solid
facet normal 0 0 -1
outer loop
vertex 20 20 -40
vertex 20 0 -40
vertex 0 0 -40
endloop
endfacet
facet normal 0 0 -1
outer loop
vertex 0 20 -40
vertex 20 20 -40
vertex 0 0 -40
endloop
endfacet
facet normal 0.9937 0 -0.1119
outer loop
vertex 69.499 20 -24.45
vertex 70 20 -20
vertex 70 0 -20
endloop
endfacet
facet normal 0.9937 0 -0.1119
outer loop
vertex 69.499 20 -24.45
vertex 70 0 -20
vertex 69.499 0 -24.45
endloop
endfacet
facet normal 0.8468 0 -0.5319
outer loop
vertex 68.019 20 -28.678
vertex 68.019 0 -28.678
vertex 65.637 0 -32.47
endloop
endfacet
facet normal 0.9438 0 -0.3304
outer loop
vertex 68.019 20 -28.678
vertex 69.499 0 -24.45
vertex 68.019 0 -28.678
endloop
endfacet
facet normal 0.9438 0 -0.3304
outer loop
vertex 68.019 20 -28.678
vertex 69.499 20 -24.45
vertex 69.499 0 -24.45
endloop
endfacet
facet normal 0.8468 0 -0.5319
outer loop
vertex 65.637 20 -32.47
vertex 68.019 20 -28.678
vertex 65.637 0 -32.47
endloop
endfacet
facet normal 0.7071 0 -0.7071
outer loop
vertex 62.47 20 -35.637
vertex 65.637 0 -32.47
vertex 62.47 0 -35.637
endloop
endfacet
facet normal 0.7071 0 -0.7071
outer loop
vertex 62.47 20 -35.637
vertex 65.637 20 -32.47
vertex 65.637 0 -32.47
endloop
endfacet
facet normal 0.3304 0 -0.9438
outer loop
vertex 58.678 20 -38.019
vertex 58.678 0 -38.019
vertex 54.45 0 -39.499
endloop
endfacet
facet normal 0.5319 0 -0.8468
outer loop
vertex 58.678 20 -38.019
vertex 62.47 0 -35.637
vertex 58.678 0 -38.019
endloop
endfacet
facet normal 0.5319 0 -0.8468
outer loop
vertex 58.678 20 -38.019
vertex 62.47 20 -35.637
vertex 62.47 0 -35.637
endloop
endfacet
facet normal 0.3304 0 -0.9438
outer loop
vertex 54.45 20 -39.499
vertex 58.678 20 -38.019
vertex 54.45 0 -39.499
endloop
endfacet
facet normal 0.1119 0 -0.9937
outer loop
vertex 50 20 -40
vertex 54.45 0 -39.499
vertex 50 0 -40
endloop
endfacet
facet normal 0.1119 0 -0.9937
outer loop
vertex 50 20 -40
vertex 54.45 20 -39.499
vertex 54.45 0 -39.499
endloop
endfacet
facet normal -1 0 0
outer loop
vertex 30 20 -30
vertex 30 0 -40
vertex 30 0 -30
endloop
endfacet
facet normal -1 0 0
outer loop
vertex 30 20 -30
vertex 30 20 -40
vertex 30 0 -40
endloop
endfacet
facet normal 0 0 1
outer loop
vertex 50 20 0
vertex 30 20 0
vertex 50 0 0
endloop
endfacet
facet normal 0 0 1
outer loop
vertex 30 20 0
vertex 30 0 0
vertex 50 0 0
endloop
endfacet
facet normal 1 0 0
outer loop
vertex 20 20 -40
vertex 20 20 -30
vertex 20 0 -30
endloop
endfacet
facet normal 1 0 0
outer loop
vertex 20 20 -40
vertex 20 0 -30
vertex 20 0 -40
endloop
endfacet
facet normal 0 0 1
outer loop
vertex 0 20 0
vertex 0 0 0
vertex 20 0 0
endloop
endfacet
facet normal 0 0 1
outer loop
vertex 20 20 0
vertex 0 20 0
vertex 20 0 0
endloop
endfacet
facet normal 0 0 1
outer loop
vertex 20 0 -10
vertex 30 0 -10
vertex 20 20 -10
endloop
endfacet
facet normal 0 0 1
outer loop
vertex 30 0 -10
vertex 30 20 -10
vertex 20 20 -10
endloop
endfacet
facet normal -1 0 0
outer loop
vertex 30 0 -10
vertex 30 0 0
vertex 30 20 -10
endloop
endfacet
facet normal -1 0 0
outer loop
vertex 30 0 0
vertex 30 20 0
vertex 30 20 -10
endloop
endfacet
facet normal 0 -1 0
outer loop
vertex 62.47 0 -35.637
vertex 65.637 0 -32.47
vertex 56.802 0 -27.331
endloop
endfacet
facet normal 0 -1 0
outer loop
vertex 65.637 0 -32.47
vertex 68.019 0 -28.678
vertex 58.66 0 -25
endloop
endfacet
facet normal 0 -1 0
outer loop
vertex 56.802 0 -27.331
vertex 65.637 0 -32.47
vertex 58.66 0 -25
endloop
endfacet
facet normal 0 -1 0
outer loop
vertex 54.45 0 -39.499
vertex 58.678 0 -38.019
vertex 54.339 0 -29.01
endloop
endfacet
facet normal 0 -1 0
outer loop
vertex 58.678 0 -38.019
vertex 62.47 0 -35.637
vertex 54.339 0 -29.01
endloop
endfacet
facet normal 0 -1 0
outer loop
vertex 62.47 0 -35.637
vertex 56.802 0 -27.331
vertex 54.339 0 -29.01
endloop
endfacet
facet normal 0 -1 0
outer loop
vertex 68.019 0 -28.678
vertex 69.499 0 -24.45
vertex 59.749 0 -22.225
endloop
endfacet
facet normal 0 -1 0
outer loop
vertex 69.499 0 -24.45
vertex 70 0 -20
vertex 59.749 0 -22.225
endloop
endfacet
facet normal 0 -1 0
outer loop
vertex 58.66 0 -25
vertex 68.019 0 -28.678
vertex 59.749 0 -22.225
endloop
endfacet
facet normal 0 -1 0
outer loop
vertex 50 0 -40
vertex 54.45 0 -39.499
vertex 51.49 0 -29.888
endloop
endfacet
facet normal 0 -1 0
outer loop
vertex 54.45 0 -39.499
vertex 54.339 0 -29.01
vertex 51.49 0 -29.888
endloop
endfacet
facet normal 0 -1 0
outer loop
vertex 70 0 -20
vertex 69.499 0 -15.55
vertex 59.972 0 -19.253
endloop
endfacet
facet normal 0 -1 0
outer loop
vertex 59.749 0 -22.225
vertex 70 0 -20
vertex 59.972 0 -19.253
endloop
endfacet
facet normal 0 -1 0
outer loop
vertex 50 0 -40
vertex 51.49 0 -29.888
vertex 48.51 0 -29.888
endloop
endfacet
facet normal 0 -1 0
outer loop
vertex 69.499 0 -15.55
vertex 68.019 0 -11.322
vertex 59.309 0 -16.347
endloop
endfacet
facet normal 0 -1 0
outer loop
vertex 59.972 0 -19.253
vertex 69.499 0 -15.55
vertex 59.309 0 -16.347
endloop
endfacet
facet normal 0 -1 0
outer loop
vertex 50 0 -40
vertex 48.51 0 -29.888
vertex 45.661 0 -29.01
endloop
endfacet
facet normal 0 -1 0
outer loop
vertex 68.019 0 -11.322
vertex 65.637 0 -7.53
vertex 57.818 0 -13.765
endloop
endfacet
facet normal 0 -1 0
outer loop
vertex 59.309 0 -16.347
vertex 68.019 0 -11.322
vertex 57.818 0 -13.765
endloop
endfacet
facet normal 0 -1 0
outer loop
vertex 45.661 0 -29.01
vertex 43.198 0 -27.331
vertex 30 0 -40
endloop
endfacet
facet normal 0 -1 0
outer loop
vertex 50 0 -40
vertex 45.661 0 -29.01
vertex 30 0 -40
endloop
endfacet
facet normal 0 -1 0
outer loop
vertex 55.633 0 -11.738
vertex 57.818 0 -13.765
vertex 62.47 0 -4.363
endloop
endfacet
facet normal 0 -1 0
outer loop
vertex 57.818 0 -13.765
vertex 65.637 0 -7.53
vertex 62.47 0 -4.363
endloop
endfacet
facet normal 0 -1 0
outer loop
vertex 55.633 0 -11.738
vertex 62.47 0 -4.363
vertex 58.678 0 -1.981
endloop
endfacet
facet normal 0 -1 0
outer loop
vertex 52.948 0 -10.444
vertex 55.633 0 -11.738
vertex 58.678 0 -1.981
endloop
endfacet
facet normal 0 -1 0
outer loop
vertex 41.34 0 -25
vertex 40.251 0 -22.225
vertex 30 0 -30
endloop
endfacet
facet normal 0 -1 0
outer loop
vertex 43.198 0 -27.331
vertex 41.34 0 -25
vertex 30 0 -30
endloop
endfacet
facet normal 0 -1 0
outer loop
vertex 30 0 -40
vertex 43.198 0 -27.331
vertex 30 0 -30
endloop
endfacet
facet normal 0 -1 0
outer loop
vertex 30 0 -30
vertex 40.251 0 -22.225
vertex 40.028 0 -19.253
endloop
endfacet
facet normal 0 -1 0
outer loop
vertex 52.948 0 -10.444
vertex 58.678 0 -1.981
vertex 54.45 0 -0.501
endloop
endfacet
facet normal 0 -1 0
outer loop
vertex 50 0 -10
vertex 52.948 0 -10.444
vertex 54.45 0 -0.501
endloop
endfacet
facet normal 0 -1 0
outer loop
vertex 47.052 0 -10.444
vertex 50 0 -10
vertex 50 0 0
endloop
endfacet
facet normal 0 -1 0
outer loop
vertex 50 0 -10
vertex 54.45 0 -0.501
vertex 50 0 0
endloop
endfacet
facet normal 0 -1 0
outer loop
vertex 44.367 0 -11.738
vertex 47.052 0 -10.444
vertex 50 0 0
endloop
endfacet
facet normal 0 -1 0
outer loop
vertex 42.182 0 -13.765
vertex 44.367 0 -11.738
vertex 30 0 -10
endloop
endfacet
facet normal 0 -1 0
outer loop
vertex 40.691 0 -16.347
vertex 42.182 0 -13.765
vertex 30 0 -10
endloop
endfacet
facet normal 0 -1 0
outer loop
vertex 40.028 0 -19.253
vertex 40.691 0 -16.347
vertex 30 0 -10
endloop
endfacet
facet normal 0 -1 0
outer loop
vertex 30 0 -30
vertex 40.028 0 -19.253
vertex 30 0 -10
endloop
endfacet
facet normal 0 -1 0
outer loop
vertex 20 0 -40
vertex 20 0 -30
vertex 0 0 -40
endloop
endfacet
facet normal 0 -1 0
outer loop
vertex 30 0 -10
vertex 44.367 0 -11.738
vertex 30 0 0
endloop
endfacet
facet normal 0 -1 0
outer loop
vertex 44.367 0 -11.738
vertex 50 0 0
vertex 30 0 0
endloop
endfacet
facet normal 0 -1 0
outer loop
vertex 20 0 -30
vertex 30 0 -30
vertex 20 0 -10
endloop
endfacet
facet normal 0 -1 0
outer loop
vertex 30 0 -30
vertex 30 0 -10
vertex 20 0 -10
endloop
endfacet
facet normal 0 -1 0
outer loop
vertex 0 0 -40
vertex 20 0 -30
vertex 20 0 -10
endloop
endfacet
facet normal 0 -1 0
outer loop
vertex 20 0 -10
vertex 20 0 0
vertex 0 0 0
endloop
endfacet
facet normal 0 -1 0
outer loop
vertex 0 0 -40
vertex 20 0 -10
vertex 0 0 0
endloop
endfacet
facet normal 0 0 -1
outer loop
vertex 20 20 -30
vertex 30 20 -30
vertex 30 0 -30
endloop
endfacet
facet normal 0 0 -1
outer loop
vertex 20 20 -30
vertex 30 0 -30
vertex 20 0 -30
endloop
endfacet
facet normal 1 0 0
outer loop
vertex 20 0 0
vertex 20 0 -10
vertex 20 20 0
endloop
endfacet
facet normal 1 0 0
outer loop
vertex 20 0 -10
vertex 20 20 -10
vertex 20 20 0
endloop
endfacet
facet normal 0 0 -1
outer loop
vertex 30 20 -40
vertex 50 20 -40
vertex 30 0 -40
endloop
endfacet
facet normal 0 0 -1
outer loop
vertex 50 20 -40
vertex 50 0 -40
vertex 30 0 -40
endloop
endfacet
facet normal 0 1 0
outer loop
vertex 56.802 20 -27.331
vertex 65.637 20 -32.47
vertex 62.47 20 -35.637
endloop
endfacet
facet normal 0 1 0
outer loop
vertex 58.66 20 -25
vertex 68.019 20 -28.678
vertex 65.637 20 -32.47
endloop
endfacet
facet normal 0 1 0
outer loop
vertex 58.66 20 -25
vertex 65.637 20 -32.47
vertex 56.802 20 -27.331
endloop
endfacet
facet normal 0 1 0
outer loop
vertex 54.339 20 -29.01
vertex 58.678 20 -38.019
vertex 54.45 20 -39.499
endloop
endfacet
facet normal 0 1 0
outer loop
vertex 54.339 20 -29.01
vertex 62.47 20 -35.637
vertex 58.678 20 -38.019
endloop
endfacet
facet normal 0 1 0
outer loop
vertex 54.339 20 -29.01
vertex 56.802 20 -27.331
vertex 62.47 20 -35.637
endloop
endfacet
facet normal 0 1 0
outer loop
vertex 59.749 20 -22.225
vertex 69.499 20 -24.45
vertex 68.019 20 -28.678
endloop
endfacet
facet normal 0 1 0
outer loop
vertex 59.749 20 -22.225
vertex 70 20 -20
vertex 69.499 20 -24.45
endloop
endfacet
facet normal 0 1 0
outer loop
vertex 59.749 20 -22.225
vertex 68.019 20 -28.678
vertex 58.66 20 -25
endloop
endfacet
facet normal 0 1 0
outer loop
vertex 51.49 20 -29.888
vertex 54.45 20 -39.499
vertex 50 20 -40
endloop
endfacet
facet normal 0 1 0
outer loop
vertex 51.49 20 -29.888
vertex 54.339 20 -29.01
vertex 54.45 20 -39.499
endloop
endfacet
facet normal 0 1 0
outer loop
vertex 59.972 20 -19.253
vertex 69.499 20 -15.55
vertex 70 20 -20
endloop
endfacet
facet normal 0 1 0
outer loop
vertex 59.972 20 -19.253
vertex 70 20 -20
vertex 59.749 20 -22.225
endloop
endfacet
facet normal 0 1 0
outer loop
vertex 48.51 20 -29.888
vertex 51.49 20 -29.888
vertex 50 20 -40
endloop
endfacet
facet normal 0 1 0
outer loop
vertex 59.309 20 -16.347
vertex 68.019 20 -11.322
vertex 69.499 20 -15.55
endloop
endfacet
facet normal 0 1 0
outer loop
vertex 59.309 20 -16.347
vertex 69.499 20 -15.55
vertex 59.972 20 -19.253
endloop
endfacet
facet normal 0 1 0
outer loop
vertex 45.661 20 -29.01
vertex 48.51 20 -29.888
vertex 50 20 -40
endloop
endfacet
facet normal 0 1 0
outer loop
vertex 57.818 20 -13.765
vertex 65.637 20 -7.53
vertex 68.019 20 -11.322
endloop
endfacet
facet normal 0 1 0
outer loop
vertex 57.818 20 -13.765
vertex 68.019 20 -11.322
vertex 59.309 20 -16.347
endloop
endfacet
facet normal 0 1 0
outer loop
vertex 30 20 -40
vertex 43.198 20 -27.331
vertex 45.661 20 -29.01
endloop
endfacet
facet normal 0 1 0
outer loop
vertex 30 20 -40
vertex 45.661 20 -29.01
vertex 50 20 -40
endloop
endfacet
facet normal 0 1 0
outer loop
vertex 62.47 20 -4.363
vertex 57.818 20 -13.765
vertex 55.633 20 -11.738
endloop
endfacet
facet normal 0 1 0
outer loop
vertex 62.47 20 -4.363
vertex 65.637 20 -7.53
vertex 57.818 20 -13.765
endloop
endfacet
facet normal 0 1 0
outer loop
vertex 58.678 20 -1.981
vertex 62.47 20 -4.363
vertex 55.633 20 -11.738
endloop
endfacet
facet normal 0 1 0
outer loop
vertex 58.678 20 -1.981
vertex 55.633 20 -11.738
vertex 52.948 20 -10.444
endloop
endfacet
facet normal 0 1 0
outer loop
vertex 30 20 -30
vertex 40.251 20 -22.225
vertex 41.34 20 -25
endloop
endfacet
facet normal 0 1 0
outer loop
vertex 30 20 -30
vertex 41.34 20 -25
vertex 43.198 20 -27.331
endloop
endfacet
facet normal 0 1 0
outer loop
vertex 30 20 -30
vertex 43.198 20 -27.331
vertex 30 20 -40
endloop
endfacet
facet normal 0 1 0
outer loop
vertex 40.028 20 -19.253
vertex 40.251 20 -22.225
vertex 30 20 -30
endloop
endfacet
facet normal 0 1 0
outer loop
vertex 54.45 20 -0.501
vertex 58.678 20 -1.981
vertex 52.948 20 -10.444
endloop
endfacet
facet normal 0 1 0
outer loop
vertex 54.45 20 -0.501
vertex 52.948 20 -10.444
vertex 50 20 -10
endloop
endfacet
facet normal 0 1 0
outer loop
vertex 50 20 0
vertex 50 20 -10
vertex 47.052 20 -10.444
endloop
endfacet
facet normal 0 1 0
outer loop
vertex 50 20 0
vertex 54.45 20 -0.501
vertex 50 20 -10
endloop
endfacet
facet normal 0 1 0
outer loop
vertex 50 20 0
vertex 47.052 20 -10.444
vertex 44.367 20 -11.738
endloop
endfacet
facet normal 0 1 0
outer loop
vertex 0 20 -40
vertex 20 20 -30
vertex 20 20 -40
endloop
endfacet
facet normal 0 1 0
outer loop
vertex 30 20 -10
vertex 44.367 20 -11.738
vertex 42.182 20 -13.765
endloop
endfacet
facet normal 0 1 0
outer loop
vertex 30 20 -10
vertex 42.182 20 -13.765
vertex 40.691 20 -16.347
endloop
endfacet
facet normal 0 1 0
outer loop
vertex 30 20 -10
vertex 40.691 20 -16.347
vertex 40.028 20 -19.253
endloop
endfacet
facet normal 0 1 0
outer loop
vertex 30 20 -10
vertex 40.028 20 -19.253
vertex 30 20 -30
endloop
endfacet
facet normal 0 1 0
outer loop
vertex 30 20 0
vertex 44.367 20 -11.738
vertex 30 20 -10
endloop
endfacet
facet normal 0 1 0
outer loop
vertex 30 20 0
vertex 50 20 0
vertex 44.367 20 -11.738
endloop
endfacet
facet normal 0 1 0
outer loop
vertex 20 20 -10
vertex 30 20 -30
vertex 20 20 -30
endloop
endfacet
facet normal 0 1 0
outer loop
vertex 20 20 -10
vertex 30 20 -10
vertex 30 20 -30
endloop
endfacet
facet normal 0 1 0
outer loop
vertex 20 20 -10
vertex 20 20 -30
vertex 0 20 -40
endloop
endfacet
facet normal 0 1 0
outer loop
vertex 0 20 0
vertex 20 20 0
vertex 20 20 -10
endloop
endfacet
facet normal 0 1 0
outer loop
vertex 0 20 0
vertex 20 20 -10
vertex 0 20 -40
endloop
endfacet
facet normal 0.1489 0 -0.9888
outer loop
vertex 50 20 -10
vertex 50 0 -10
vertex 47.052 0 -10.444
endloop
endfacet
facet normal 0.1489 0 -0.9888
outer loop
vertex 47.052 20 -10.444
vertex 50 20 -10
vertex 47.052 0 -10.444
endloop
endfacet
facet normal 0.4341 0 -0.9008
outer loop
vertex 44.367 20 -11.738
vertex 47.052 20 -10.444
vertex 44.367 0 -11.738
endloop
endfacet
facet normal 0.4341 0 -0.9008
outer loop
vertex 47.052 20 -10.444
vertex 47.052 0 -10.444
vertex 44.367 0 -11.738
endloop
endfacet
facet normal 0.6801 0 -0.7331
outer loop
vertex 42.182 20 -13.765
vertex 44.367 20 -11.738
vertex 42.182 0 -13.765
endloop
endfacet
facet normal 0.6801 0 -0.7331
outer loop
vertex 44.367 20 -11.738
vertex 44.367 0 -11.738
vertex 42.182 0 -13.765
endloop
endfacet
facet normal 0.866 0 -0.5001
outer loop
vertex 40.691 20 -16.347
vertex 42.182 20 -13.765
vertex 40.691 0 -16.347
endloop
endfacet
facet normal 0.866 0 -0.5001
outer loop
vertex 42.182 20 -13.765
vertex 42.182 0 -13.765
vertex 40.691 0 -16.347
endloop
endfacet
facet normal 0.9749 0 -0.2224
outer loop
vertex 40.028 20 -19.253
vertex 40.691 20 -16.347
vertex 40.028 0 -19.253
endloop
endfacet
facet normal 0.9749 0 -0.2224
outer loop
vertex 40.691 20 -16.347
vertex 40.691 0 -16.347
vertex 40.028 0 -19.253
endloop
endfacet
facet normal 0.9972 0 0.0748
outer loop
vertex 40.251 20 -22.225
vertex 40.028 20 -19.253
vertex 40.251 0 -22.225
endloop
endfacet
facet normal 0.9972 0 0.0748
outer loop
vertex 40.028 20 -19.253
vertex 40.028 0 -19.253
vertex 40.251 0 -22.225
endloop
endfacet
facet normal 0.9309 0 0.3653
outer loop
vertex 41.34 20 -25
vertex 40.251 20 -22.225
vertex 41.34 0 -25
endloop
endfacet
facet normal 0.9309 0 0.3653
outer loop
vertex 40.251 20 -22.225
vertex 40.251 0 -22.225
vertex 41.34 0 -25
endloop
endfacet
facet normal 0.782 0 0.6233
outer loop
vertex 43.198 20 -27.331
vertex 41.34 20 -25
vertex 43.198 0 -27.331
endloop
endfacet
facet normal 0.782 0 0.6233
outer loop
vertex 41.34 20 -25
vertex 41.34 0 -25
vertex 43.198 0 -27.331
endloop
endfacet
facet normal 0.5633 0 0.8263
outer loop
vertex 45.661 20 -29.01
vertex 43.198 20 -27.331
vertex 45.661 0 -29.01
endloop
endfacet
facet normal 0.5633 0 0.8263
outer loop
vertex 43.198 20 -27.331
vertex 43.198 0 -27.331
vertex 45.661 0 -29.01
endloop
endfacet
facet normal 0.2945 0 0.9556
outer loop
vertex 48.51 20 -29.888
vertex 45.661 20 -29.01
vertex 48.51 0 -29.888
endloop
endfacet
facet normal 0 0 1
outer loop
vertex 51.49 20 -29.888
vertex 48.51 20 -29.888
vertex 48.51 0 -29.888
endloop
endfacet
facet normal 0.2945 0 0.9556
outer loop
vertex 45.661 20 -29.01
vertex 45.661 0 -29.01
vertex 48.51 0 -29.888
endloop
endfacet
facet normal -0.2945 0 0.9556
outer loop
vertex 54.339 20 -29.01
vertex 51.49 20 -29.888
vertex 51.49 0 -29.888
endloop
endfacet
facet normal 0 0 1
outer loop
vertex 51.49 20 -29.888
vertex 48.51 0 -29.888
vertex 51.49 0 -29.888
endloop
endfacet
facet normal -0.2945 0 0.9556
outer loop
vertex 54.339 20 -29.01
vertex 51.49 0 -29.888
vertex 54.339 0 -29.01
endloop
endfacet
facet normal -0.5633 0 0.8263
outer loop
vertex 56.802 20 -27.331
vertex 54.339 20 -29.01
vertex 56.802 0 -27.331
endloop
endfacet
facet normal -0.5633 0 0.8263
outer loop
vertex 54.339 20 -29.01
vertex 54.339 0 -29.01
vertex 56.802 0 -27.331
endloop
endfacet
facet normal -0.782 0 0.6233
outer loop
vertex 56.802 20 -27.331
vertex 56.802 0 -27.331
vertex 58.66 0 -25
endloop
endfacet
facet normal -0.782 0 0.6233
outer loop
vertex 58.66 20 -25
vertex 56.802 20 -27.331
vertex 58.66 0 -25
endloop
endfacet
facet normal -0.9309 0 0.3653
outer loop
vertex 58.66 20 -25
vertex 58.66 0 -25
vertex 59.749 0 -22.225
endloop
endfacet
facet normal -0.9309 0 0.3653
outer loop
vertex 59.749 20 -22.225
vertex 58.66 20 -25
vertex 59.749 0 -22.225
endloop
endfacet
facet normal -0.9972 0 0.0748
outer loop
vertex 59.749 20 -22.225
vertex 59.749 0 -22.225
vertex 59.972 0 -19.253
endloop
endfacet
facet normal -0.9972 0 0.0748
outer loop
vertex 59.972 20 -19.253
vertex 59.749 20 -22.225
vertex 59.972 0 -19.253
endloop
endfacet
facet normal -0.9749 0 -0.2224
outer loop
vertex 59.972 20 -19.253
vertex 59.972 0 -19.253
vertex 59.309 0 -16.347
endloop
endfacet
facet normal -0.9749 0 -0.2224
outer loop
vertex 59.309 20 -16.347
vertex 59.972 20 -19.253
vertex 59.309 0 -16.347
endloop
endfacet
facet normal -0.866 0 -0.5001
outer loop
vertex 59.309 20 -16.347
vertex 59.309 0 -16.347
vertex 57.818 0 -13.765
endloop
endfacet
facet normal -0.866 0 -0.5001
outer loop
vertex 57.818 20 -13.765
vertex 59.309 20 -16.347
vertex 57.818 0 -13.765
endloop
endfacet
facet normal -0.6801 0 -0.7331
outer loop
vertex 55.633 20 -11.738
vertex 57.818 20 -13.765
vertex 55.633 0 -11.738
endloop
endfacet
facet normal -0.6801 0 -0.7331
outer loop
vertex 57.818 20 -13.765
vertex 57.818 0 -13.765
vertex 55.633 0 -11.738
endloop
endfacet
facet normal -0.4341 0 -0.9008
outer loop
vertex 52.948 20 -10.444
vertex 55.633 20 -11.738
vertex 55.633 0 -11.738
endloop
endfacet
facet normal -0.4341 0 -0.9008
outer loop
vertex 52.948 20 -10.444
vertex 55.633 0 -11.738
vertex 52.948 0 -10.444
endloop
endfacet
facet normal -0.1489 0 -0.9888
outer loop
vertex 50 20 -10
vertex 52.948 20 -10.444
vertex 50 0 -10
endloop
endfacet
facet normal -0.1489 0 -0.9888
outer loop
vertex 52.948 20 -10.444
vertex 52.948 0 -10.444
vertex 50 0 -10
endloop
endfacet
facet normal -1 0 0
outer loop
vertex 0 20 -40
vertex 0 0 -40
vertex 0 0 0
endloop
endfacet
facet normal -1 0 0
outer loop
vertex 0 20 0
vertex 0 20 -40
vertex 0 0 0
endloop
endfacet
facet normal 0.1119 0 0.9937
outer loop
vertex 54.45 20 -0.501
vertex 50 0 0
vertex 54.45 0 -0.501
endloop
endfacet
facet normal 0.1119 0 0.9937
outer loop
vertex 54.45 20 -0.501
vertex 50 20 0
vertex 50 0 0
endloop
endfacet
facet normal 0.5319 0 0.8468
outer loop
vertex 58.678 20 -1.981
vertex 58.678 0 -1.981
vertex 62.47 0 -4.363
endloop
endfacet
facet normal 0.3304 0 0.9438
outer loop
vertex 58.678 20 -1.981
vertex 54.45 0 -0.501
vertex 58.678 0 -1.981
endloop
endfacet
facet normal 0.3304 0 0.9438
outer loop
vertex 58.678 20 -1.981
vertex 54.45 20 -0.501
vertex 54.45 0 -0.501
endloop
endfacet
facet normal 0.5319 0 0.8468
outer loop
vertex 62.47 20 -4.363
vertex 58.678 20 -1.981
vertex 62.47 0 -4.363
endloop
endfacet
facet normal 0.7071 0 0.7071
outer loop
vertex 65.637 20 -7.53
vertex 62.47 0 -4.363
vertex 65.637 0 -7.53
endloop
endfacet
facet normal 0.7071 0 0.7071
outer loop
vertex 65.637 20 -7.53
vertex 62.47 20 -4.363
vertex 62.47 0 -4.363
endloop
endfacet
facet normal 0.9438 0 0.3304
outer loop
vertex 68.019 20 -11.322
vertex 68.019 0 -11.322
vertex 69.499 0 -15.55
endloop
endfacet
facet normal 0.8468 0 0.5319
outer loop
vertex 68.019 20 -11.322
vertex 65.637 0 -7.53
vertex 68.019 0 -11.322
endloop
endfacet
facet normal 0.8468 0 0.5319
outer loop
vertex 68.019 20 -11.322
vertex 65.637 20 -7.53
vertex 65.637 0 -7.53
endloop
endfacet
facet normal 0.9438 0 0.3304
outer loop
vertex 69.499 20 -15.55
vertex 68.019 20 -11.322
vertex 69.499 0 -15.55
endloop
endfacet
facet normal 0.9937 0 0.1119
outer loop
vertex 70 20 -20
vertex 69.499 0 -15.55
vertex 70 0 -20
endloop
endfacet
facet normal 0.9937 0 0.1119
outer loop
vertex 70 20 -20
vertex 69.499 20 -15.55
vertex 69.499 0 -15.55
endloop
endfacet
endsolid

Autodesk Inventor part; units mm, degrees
ref_plane "YZ Plane" through (0, 0, 0) normal (1, 0, 0) x (0, 1, 0)
ref_plane "XZ Plane" through (0, 0, 0) normal (0, 1, 0) x (-1, 0, 0)
ref_plane "XY Plane" through (0, 0, 0) normal (0, 0, 1) x (1, 0, 0)
sketch "草圖1" plane through (0, 0, 0) normal (0, 1, 0) x (-1, 0, 0)
  line L0 (0, 0) -> (-70, 0)
  line L1 (-70, 0) -> (-70, -40)
  line L2 (-70, -40) -> (0, -40)
  line L3 (0, -40) -> (0, 0)
  dimension "d0" = 40
  dimension "d1" = 70
extrude "擠出1" add sketch "草圖1" along normal blind 20
sketch "草圖2" plane through (0, 20, 0) normal (0, 1, 0) x (1, 0, 0)
  line L0 (0, 0) -> (70, 0) projected
  line L1 (20, 0) -> (30, 0)
  line L2 (30, 0) -> (30, 10)
  line L3 (30, 10) -> (20, 10)
  line L4 (20, 10) -> (20, 0)
  line L5 (70, 40) -> (0, 40) projected
  line L6 (20, 40) -> (30, 40)
  line L7 (30, 40) -> (30, 30)
  line L8 (30, 30) -> (20, 30)
  line L9 (20, 30) -> (20, 40)
  line L10 (0, 40) -> (0, 0) projected
  dimension "d4" = 10
  dimension "d5" = 10
  dimension "d6" = 10
  dimension "d7" = 20
extrude "擠出2" cut sketch "草圖2" against normal blind 20
fillet "圓角1" radius 20 2 edges at (70, 10, 0) (70, 10, -40)
hole "孔1" at (50, 20, -20) direction (0, -1, 0) diameter 20 depth 20 tip angle 118
properties part number "32"
